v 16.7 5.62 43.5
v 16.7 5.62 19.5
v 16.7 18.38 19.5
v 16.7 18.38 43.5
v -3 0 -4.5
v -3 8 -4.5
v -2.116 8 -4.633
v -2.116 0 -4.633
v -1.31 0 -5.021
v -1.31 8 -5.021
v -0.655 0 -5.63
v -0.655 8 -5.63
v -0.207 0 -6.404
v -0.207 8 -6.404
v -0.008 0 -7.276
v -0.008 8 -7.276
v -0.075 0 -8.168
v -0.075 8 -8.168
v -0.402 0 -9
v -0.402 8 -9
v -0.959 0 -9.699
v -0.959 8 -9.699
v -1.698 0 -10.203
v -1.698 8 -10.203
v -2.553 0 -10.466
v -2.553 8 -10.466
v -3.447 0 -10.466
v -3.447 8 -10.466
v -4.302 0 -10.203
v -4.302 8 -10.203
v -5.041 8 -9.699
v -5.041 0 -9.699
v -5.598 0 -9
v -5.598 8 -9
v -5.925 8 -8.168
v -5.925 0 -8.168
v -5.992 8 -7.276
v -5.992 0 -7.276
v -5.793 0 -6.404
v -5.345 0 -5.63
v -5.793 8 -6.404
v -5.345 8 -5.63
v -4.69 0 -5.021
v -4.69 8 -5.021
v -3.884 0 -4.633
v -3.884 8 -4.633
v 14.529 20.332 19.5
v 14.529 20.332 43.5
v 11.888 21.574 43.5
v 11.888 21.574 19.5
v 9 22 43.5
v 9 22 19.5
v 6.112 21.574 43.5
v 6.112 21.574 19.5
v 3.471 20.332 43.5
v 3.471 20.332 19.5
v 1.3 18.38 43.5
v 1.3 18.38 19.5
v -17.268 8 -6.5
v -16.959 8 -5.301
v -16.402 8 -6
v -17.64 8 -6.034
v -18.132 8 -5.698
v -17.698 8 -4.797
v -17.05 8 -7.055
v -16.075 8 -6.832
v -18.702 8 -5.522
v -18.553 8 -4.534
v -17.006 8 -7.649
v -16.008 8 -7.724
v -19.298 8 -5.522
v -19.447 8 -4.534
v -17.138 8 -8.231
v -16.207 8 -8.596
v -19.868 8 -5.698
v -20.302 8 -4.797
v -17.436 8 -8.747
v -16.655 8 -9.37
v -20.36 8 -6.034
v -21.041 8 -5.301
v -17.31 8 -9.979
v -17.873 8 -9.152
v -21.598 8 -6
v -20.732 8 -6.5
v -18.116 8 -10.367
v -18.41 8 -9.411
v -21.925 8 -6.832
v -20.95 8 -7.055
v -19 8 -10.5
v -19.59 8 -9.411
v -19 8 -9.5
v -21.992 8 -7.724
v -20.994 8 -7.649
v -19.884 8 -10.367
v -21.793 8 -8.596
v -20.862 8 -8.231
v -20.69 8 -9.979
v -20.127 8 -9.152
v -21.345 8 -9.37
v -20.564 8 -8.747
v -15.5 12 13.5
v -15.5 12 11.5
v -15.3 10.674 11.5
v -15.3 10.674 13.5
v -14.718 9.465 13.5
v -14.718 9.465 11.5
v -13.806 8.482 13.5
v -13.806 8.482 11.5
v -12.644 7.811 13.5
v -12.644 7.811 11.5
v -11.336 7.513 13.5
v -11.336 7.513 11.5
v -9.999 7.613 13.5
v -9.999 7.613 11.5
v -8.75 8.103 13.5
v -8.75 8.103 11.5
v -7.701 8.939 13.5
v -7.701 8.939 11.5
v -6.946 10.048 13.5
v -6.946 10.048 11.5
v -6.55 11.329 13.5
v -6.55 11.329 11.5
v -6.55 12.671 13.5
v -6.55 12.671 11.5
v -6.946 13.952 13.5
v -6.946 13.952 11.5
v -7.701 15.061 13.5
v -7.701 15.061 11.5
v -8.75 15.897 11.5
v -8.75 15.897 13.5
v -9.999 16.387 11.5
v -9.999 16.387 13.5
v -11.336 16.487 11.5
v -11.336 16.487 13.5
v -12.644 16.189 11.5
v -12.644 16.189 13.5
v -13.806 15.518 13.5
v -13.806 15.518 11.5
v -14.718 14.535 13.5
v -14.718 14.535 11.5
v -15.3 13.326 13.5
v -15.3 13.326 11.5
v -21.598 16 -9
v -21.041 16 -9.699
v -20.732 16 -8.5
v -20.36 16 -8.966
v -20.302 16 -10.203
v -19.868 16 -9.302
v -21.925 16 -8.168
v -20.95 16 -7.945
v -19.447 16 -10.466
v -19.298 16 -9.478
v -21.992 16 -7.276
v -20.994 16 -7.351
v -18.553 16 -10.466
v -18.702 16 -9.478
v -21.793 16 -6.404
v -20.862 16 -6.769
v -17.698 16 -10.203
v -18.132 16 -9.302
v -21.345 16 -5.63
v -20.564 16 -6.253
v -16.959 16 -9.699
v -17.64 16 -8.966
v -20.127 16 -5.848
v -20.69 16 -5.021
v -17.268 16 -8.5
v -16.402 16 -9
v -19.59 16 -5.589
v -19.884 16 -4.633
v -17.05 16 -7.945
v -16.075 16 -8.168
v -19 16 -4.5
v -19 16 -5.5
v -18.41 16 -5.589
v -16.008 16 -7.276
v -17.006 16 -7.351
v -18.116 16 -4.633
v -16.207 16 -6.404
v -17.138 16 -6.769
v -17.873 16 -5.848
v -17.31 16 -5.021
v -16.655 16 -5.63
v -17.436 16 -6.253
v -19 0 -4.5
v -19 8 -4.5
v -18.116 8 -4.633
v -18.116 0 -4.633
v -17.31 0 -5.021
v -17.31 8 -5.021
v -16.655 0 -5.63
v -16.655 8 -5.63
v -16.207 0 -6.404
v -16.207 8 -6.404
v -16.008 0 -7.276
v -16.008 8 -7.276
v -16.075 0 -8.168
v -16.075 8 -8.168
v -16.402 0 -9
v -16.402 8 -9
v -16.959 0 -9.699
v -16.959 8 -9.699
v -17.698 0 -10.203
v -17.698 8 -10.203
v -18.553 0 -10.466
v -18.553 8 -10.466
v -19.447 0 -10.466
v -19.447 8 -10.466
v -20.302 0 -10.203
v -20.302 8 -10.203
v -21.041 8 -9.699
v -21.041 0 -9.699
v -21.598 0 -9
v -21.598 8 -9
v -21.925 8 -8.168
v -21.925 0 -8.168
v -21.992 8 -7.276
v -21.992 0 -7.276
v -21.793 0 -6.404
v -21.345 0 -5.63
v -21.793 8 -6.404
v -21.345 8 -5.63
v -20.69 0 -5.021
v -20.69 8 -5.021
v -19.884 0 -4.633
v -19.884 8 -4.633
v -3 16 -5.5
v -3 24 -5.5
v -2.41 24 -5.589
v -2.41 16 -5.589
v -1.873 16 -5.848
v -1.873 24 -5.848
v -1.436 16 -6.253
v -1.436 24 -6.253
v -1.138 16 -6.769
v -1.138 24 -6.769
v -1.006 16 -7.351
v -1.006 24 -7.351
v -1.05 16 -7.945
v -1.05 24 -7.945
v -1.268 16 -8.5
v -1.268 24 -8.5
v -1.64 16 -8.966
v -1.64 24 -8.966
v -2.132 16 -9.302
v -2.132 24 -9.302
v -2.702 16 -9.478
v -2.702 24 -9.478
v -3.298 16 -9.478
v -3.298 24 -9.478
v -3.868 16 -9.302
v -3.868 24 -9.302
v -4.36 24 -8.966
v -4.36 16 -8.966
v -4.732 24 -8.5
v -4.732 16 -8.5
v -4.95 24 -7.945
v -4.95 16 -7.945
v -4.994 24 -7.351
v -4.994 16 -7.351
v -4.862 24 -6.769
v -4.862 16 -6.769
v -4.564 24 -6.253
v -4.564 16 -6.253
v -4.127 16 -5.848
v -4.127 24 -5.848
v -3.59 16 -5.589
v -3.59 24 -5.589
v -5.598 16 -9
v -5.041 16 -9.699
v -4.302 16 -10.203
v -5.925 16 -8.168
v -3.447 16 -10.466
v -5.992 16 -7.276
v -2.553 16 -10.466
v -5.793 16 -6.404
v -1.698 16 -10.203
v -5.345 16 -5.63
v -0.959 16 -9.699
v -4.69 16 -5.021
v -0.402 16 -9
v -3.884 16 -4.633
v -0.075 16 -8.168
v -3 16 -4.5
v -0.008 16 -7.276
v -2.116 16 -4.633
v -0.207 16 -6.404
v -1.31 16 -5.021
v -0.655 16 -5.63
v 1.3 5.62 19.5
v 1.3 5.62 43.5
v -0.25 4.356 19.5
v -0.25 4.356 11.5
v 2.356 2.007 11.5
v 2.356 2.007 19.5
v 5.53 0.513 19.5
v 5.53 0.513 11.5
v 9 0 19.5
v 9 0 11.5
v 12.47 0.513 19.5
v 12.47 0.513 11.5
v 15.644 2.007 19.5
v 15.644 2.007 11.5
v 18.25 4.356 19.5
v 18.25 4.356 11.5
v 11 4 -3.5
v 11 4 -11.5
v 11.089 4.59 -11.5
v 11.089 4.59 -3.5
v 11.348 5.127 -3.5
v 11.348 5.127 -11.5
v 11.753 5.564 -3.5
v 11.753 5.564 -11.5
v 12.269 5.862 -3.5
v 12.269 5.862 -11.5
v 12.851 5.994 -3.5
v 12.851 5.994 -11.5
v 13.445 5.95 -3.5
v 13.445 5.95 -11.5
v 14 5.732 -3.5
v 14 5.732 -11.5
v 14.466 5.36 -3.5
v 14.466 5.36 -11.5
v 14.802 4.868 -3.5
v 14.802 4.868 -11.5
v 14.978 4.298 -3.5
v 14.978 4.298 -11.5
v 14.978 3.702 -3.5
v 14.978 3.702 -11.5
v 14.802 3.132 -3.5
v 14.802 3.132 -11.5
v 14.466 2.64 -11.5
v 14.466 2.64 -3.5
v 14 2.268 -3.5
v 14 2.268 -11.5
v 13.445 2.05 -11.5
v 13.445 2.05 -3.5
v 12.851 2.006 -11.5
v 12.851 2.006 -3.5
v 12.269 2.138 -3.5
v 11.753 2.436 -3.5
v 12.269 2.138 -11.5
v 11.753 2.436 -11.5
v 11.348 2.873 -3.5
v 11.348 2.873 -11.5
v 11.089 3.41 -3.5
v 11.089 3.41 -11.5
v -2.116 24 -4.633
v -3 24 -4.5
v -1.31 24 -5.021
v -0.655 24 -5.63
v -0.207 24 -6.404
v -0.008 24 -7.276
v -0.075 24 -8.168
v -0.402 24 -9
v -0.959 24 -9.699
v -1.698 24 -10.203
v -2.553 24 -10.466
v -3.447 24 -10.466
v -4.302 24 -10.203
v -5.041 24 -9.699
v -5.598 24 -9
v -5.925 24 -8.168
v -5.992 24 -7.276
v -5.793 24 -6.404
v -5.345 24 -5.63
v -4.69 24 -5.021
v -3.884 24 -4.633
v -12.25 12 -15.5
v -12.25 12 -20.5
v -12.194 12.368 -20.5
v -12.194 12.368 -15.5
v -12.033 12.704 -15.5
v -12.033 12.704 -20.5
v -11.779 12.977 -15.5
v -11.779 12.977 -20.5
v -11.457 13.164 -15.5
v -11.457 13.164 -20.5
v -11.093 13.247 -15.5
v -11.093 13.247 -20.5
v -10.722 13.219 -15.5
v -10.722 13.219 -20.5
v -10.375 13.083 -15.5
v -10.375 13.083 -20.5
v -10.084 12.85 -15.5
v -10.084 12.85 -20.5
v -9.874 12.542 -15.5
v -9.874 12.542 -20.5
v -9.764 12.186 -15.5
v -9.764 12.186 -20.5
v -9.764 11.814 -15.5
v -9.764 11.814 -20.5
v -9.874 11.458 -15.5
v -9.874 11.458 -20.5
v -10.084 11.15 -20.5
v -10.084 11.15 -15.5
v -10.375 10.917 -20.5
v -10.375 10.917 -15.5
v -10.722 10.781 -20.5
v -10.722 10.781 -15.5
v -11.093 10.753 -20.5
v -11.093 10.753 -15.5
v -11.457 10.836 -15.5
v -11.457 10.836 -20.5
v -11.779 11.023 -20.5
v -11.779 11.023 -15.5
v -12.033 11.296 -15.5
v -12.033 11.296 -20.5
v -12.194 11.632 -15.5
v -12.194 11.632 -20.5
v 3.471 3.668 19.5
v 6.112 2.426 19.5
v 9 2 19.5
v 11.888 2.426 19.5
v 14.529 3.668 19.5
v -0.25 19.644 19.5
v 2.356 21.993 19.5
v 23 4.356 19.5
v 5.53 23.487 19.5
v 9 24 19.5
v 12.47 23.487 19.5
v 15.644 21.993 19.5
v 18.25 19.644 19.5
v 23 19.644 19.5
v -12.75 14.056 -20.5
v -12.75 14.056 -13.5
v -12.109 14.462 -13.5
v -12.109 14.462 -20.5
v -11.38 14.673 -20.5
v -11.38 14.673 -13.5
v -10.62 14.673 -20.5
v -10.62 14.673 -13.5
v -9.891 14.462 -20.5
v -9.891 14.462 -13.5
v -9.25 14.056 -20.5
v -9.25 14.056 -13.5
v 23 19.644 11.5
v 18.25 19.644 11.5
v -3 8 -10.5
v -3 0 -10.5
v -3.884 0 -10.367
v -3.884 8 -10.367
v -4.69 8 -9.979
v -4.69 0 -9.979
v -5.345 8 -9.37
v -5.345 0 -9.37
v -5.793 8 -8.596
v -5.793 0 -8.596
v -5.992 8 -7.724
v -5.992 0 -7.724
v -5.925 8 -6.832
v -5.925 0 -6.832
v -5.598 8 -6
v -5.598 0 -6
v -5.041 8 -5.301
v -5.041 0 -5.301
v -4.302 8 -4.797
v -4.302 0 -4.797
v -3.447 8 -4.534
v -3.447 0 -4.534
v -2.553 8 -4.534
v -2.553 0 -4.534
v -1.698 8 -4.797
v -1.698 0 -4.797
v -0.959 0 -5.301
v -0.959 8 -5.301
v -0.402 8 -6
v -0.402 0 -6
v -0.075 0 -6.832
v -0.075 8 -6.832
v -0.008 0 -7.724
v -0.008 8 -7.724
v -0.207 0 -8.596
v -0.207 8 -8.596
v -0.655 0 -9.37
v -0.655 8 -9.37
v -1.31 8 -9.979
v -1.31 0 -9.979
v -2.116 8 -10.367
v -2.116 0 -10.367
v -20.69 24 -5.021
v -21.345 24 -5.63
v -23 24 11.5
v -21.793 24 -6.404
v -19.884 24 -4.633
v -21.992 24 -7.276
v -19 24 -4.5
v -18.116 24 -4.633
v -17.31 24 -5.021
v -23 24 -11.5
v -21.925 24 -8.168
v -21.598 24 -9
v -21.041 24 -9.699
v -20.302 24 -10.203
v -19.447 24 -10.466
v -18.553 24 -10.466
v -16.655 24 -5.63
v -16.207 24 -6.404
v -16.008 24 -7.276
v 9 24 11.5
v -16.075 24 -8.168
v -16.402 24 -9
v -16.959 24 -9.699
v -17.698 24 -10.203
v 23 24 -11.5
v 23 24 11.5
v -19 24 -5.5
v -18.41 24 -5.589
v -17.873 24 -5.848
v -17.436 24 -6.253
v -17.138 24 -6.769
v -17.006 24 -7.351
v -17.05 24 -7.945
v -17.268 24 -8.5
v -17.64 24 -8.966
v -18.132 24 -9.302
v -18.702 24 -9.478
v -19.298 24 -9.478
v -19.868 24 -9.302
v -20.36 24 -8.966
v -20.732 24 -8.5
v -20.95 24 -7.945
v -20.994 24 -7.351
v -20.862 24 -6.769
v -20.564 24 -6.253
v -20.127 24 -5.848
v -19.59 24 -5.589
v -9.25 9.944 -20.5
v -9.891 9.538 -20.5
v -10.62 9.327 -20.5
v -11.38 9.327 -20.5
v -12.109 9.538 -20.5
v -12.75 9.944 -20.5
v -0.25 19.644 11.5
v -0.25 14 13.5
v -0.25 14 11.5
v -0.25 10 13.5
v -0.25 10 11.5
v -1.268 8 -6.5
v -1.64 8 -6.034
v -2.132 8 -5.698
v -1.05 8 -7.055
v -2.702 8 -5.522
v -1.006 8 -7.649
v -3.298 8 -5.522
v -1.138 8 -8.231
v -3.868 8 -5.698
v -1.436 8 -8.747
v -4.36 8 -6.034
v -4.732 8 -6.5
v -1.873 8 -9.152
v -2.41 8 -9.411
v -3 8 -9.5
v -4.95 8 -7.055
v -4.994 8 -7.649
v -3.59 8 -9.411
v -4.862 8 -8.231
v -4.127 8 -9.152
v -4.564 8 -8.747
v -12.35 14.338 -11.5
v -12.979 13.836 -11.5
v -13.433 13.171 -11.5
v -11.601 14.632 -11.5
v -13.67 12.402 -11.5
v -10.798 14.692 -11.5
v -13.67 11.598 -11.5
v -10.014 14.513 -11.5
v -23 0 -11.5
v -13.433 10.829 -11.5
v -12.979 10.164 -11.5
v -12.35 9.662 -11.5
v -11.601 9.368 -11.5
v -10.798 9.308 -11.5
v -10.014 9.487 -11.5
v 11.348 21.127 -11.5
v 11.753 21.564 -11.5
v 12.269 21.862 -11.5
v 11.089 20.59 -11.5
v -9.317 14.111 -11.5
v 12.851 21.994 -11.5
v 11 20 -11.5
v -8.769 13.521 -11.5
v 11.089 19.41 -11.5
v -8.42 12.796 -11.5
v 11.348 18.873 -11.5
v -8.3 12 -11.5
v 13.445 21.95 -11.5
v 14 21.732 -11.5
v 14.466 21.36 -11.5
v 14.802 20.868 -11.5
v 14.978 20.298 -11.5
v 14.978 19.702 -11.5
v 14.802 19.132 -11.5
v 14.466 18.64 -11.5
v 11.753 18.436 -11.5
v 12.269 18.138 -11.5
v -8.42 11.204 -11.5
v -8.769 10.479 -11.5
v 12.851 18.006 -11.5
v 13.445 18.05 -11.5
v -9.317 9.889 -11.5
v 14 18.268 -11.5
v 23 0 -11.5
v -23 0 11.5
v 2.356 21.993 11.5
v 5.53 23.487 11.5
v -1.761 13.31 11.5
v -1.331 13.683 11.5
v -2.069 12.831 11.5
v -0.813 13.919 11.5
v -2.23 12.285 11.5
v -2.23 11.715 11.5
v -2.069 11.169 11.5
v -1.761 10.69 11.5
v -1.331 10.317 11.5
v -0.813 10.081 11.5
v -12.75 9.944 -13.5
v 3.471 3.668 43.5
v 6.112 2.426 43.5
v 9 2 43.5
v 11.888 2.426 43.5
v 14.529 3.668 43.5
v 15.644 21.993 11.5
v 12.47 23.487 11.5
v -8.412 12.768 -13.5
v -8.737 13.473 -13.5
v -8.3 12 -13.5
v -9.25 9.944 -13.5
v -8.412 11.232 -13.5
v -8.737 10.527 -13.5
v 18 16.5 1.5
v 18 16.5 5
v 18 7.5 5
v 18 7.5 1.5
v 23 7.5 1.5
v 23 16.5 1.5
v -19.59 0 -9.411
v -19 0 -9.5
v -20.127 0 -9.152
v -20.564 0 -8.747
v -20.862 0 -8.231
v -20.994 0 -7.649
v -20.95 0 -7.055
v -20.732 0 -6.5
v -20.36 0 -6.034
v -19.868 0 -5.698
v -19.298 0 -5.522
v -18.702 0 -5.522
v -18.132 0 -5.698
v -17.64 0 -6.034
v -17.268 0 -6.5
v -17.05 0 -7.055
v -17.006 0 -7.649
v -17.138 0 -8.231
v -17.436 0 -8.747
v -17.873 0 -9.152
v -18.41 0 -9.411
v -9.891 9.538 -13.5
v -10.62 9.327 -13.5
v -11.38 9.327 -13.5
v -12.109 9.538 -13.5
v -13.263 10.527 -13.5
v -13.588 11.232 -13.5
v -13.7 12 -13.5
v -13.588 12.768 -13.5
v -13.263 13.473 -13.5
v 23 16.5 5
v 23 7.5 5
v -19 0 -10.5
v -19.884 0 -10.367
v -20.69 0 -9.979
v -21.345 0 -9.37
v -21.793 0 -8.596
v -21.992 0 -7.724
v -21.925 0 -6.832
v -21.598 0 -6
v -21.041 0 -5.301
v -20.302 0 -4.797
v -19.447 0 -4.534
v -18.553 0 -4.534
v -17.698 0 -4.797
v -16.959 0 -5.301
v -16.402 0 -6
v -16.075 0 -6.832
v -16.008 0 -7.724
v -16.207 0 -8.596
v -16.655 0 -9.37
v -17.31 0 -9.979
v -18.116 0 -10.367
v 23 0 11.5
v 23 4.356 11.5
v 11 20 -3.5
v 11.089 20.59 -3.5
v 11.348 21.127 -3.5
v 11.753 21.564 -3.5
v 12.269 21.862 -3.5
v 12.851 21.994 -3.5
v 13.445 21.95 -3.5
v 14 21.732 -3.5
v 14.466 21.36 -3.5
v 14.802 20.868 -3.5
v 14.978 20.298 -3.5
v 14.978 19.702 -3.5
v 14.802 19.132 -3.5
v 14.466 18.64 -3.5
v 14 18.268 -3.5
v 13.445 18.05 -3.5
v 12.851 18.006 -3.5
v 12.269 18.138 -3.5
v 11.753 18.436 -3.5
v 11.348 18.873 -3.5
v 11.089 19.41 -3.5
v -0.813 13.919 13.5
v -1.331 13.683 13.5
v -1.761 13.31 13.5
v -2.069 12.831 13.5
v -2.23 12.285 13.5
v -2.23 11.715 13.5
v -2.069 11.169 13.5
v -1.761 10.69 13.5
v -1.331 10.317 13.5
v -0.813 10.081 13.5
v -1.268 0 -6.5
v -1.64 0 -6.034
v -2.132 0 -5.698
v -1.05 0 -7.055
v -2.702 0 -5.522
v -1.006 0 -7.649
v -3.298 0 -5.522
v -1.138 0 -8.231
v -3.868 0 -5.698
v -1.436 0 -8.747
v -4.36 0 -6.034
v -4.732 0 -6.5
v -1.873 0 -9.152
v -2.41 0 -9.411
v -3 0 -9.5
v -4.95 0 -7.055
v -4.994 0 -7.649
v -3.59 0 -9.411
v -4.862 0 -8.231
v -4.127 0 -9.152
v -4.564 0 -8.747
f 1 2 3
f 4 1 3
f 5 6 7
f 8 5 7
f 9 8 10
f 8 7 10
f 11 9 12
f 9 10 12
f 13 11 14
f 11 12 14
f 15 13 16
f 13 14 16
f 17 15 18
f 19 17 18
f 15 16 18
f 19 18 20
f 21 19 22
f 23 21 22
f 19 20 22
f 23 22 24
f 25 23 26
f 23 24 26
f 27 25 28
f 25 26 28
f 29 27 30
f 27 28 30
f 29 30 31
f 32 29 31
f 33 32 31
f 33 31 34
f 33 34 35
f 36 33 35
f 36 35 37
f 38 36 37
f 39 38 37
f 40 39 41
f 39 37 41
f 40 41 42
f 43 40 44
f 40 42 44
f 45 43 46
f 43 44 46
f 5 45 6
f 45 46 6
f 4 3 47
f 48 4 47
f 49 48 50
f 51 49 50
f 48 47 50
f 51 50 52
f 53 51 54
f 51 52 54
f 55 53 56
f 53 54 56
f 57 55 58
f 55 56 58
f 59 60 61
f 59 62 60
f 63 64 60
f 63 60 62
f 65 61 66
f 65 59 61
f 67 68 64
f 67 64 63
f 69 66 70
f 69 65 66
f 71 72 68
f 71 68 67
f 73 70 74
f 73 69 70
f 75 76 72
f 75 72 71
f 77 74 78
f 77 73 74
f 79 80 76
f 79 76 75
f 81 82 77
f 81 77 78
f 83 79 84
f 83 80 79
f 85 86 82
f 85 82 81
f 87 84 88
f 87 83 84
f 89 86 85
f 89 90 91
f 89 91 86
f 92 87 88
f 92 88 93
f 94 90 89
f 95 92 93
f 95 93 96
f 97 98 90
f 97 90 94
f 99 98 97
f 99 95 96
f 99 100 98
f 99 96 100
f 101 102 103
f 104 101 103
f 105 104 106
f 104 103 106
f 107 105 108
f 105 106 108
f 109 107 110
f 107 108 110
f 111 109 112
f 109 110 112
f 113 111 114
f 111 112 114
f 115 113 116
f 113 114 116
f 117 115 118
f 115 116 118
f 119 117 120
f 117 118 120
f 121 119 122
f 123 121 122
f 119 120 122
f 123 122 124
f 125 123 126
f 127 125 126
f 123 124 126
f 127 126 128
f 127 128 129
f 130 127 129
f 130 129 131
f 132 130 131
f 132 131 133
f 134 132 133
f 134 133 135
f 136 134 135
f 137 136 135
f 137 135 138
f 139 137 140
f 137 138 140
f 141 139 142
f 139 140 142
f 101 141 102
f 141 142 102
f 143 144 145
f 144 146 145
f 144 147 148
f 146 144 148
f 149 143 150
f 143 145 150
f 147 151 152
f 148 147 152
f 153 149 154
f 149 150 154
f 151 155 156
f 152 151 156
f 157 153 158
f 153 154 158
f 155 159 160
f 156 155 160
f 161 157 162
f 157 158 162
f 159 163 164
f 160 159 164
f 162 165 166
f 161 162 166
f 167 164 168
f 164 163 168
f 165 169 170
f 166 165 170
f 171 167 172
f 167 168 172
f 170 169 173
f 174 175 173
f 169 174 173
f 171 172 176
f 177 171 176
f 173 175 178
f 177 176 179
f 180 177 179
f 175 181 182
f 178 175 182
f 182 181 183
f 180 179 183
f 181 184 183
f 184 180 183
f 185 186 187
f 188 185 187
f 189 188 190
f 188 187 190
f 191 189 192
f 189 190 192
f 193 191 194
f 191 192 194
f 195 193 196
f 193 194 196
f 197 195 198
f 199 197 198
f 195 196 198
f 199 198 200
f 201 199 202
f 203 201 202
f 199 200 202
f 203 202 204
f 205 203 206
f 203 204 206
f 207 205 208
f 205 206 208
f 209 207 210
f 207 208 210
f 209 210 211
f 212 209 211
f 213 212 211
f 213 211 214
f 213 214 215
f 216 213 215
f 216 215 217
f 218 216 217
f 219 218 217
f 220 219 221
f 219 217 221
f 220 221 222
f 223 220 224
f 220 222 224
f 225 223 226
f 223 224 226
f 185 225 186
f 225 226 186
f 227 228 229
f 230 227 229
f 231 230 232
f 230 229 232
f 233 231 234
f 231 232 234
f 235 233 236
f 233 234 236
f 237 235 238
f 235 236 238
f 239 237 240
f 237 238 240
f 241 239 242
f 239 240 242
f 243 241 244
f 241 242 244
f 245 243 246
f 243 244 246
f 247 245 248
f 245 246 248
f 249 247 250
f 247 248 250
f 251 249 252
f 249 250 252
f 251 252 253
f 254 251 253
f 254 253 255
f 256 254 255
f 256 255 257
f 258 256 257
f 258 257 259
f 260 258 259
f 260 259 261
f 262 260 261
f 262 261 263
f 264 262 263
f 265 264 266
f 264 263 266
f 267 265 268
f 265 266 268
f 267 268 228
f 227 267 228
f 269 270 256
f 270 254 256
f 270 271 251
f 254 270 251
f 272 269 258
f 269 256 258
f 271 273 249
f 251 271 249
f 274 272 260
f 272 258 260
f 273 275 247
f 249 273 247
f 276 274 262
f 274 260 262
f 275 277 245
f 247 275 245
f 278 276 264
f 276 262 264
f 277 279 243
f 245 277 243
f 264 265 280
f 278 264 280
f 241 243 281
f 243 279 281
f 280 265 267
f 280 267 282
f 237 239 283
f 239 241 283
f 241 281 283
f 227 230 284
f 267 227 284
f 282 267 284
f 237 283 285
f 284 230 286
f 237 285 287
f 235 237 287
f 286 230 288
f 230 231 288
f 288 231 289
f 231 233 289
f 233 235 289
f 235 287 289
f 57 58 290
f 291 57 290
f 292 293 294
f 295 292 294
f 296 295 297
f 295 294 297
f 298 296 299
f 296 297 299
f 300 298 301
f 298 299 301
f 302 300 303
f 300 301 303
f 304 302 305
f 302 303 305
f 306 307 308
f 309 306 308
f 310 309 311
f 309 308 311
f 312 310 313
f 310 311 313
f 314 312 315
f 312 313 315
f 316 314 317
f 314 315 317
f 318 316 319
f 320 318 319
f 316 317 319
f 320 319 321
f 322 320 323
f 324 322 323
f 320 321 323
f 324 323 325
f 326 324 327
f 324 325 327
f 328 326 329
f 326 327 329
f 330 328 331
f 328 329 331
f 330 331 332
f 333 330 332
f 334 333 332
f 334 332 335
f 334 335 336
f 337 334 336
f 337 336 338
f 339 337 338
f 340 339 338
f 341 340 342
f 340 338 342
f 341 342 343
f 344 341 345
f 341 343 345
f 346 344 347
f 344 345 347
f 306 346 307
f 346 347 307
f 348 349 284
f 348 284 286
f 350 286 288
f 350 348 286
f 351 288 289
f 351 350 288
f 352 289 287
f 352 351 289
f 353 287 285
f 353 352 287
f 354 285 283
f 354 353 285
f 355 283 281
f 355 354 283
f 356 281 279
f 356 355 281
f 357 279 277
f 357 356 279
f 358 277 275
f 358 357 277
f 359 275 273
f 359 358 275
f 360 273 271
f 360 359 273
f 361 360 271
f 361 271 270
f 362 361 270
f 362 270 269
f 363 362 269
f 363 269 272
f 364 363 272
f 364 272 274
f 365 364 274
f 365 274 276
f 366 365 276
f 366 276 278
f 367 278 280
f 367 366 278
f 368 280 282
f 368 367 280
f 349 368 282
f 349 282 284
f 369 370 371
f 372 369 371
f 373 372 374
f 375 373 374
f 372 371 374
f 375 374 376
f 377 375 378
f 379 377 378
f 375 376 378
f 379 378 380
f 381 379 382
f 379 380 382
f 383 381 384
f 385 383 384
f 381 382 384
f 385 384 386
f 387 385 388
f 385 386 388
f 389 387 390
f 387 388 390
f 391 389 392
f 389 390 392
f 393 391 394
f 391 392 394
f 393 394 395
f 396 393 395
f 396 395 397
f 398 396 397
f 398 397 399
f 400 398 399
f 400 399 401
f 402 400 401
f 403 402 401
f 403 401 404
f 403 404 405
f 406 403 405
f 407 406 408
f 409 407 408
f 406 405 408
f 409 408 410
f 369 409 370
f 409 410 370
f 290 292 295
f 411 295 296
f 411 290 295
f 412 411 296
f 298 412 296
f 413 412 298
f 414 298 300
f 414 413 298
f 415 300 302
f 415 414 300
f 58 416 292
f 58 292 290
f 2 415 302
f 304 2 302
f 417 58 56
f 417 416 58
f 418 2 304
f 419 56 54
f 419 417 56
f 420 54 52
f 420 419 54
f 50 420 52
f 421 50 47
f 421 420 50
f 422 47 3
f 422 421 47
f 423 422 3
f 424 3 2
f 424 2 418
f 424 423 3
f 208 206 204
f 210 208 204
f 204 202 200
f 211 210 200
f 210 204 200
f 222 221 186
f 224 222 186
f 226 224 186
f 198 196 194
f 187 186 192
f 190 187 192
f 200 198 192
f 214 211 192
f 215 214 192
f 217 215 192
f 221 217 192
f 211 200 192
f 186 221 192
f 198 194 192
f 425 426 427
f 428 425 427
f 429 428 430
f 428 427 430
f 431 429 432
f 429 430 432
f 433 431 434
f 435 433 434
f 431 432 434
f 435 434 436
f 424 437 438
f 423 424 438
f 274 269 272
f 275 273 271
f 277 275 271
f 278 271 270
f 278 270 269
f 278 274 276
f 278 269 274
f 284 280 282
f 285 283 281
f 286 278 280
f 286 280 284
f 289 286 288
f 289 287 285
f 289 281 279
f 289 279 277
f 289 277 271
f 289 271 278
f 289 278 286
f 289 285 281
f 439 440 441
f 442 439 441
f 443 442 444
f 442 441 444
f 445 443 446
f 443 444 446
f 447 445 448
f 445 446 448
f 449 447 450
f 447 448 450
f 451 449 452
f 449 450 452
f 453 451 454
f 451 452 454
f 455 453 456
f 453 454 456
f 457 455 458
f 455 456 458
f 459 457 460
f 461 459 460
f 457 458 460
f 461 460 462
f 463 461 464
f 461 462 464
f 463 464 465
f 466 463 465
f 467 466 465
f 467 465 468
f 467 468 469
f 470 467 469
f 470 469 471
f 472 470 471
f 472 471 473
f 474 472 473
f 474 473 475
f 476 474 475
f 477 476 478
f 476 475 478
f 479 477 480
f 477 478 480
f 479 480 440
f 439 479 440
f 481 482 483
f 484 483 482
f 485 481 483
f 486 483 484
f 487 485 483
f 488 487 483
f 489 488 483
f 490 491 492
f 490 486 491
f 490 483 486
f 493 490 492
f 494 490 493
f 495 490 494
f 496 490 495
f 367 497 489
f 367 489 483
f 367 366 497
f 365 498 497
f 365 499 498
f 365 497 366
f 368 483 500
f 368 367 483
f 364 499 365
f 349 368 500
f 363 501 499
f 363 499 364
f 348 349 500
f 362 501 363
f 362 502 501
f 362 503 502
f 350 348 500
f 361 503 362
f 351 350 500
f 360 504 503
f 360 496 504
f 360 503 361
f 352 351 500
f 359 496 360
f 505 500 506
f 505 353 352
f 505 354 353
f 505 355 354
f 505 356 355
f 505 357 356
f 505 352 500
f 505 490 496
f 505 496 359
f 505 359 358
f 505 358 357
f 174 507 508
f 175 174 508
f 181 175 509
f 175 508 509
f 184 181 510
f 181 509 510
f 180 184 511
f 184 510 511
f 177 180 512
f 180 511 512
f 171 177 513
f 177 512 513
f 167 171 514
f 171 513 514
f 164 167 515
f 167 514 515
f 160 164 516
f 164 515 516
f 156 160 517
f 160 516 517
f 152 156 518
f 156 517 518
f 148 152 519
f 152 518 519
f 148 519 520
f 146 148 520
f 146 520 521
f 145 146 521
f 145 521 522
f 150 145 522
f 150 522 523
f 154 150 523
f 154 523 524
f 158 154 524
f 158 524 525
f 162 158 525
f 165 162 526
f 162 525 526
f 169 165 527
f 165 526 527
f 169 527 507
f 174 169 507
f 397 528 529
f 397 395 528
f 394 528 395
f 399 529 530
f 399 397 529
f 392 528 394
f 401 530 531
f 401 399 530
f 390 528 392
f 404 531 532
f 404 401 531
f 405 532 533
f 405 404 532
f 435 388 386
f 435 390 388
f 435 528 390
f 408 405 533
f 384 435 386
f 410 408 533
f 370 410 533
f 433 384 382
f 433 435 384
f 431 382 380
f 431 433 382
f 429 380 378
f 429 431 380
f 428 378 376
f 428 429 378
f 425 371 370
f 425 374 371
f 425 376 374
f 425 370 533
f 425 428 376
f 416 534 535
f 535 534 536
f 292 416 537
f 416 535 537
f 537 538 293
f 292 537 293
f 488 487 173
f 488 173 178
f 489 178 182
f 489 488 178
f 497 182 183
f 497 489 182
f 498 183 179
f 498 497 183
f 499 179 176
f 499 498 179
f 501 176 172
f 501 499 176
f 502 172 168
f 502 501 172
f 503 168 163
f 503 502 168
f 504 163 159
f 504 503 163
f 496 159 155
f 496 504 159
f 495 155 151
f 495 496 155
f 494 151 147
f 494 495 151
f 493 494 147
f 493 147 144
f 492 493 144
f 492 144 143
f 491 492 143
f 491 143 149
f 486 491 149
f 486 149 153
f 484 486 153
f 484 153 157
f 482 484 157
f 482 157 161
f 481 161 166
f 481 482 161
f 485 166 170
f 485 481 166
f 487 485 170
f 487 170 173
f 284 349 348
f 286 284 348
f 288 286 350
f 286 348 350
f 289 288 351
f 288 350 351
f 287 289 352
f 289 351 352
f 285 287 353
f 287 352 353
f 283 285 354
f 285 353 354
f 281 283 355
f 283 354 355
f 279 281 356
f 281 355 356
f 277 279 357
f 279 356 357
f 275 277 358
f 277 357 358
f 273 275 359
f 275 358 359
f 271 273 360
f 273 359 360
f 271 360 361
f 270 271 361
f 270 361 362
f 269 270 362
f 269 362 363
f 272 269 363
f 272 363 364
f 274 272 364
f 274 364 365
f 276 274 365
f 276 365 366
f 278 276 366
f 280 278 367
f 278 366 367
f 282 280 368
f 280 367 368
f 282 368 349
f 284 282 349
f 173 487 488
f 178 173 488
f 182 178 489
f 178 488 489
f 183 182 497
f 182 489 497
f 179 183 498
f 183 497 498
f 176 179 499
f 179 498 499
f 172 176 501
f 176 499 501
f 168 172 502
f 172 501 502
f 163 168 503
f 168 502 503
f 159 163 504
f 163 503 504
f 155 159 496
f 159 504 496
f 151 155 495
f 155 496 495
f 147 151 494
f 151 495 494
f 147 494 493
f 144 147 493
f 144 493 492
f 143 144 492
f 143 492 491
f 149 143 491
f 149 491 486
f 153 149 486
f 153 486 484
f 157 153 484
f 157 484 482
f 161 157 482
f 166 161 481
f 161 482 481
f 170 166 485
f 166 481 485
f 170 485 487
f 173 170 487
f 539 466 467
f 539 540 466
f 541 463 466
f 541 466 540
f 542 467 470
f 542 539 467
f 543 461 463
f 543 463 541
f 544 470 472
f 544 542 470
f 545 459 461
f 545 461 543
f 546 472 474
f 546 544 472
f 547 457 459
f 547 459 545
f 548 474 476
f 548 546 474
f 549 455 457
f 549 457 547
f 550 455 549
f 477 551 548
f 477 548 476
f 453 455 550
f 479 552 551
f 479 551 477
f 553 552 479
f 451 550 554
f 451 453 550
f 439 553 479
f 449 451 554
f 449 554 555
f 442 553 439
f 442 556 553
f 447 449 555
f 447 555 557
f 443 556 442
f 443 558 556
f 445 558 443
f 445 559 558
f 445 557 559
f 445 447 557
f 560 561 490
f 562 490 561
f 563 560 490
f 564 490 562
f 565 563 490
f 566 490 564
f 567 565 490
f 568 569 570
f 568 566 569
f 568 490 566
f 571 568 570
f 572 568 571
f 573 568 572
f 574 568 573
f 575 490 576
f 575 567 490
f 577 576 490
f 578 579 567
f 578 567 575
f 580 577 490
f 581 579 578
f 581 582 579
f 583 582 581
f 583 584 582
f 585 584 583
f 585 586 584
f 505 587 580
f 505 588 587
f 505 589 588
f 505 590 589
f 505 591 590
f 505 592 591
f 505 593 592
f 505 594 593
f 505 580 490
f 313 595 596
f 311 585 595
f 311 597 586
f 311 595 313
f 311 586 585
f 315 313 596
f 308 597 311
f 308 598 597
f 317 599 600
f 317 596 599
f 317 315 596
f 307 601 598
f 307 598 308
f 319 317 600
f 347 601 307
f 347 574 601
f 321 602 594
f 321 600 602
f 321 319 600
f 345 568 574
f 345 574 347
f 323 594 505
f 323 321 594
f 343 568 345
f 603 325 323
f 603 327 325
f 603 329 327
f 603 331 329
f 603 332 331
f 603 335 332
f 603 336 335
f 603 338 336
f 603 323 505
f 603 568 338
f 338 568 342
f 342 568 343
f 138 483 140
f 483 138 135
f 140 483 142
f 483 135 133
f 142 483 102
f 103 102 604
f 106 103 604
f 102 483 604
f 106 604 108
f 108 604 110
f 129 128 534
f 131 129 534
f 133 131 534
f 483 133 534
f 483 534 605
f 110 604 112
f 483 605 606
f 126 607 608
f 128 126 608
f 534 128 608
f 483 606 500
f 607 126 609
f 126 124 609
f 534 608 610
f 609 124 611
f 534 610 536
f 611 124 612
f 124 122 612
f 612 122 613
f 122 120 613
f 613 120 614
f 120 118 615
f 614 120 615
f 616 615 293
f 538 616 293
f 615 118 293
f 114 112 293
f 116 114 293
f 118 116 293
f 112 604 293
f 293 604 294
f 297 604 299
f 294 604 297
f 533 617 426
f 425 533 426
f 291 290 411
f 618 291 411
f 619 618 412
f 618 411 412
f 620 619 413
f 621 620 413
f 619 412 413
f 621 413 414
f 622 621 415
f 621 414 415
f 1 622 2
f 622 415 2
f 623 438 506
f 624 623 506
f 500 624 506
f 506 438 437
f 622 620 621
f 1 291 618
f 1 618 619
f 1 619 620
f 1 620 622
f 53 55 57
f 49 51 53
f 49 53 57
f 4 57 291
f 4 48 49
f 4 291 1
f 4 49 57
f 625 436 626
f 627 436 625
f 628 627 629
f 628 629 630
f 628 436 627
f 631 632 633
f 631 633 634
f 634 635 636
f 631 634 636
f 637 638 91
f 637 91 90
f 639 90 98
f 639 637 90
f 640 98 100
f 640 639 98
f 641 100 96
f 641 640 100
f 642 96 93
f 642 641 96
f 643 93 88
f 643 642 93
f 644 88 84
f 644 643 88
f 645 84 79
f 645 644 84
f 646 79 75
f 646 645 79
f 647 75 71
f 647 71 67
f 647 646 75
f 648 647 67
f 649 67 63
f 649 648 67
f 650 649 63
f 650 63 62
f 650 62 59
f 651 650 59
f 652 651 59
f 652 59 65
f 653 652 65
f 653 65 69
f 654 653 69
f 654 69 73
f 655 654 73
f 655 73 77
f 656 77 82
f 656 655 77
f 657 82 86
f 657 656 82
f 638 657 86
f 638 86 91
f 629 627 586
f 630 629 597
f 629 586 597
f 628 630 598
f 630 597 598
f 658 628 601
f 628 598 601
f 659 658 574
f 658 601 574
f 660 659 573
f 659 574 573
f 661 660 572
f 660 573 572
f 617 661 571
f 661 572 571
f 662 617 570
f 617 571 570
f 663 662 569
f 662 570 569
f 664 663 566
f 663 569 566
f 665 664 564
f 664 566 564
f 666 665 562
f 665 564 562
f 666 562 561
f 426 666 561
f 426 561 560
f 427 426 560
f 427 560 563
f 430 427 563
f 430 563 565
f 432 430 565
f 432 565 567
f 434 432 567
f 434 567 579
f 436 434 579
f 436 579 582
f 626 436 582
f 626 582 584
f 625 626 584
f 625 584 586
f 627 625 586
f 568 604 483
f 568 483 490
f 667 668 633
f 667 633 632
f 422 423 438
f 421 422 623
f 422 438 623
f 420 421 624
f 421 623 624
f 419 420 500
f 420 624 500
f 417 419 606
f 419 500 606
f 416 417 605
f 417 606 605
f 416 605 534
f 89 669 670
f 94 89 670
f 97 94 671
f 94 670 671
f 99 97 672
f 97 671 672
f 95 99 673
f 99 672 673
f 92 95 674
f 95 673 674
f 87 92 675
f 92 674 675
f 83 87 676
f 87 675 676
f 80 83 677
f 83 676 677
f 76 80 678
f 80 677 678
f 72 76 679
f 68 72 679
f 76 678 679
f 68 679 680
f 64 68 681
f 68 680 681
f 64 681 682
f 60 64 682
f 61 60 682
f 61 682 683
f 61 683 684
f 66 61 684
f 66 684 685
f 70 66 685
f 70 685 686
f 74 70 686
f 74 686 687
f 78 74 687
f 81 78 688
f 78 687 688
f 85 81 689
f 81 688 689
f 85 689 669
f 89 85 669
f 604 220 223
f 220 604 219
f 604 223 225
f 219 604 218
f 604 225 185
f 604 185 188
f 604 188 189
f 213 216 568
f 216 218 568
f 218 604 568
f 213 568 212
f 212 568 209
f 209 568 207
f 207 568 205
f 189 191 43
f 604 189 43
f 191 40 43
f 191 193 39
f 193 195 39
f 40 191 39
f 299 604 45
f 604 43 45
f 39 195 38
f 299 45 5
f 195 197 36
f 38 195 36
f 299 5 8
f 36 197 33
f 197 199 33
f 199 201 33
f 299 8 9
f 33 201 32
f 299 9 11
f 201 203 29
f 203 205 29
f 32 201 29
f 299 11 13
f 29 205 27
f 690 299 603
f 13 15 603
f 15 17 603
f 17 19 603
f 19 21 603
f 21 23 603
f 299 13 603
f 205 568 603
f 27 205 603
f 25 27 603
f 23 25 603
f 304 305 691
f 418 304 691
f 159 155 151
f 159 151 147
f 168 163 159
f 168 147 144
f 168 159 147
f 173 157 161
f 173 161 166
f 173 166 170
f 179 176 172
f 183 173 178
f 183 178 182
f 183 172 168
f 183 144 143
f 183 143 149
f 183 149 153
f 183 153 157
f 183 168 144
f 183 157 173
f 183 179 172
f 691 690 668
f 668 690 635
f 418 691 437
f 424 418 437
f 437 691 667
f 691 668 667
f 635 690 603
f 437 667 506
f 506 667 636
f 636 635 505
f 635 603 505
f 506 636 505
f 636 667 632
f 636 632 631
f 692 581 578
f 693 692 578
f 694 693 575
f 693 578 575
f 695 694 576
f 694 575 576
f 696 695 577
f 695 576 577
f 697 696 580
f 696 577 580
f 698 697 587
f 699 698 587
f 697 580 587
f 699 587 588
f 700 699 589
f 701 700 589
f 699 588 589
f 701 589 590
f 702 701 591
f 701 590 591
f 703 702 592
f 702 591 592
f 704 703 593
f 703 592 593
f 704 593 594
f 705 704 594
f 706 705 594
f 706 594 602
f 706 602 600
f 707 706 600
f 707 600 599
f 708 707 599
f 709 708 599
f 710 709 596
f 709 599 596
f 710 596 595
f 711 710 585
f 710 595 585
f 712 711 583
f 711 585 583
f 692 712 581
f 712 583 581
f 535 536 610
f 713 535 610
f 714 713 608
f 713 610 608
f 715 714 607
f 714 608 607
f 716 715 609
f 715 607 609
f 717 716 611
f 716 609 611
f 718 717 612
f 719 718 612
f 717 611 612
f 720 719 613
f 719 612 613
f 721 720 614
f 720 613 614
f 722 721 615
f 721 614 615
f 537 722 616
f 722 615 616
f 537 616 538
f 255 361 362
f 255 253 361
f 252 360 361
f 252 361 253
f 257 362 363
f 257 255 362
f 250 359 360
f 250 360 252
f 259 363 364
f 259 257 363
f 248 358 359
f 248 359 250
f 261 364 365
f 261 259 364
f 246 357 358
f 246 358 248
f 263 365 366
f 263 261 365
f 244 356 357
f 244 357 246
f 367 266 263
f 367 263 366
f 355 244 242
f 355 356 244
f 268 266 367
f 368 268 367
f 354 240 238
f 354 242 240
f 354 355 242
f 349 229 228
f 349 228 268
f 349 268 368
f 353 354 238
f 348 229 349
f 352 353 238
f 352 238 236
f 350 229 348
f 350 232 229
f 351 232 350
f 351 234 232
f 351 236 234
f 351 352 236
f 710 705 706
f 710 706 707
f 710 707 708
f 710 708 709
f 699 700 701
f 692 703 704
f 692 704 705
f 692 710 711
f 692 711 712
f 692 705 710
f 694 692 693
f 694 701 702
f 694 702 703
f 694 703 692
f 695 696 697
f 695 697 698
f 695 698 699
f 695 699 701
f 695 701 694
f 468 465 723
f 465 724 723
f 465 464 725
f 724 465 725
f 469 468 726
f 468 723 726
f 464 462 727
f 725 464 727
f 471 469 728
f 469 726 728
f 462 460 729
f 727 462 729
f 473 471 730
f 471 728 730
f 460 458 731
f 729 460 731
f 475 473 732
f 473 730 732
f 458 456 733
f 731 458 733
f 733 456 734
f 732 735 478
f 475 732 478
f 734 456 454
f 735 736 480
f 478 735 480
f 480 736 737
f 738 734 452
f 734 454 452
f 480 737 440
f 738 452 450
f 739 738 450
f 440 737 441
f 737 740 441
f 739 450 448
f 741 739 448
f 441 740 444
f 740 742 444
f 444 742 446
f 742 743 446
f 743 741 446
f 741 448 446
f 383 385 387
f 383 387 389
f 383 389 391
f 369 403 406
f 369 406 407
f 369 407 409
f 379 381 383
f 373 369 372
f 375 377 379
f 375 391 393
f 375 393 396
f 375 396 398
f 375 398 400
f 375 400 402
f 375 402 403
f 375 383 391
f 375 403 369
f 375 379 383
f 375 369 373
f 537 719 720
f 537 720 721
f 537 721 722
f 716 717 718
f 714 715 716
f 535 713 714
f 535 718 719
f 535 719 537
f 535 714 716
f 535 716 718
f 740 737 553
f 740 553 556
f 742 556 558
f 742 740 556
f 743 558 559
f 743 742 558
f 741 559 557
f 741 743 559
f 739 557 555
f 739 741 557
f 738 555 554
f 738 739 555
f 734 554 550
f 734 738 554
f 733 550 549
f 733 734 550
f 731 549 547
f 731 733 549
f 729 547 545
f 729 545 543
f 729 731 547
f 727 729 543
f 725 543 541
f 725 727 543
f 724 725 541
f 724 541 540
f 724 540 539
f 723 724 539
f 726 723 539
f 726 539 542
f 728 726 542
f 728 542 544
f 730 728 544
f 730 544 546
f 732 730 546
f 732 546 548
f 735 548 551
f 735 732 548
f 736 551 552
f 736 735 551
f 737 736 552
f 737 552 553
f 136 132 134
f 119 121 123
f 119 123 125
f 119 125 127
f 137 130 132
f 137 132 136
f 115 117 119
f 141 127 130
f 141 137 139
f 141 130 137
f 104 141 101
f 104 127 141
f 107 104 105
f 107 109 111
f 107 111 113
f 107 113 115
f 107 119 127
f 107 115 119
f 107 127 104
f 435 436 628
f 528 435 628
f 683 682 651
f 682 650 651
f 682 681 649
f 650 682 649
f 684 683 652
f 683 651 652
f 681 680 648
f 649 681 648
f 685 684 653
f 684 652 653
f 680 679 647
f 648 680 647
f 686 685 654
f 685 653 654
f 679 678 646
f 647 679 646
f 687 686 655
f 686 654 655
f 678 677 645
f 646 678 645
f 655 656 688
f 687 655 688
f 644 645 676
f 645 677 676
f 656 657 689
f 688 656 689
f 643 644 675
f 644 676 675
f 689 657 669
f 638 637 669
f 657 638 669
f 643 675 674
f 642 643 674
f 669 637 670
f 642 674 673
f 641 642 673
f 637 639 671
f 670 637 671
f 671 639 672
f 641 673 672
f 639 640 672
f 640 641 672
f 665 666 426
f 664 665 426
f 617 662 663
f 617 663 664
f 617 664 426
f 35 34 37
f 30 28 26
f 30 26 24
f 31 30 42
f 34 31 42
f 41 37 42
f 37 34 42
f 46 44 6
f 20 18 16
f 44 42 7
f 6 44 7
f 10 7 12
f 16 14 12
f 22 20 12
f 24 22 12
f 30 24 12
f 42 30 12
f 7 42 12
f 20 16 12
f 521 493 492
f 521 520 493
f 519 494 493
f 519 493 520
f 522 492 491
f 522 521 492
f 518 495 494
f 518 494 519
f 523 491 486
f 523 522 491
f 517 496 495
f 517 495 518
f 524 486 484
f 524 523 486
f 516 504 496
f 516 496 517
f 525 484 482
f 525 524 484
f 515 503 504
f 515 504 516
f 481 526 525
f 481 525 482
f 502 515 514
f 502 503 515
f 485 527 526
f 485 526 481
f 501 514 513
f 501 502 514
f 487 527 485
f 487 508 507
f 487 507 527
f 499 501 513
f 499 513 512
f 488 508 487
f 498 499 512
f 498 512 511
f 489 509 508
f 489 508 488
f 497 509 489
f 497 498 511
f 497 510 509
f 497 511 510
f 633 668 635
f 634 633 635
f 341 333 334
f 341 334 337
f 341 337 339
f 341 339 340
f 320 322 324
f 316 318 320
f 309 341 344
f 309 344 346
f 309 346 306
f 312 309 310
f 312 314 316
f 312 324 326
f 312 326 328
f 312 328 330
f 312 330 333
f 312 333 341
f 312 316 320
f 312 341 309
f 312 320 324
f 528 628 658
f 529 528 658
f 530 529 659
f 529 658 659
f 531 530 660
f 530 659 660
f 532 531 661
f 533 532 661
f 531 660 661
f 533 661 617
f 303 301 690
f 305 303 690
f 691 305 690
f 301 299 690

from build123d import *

# Parameters (mm, degrees)
SKETCH_1_W            = 46
SKETCH_1_H            = 23
EXTRUDE_1_DEPTH       = 24
EXTRUDE_2_DEPTH       = 8
EXTRUDE_3_DEPTH       = 24
SKETCH_4_R            = 4.5
SKETCH_4_R_2          = 2
EXTRUDE_4_DEPTH       = 2
SKETCH_6_W            = 3.5
SKETCH_6_H            = 9
CUT_EXTRUDE_1_DEPTH   = 5
SKETCH_7_R            = 2.7
EXTRUDE_5_DEPTH       = 2
EXTRUDE_6_DEPTH       = 7
SKETCH_9_R            = 1.25
CUT_EXTRUDE_2_DEPTH   = 5
SKETCH_10_R           = 3
CUT_EXTRUDE_3_DEPTH   = 8
CUT_EXTRUDE_START     = -16
SKETCH_10_2_R         = 3
CUT_EXTRUDE_4_DEPTH   = 8
SKETCH_11_R           = 2
CUT_EXTRUDE_5_DEPTH   = 8
SKETCH1_R             = 3
SKETCH1_R_2           = 2
BOSS_EXTRUDE1_DEPTH   = 8
BOSS_EXTRUDE1_2_DEPTH = 8
BOSS_EXTRUDE2_START   = -24
SKETCH1_2_R           = 3
SKETCH1_2_R_2         = 2
BOSS_EXTRUDE2_DEPTH   = 8
BOSS_EXTRUDE2_2_DEPTH = 8


with BuildPart() as part:
    # 草图1 → 凸台-拉伸1 (new body)
    with BuildSketch(Plane(origin=(0, 0, 0), x_dir=(1, 0, 0), z_dir=(0, 1, 0))):
        Rectangle(SKETCH_1_W, SKETCH_1_H)
    extrude(amount=EXTRUDE_1_DEPTH)

    # 草图2 → 凸台-拉伸2 (add)
    with BuildSketch(Plane.XY.offset(11.5)):
        with BuildLine():
            Line((-0.25, 19.644442426), (-0.25, 4.355557574))
            ThreePointArc((-0.25, 4.355557574), (9, 0), (18.25, 4.355557574))
            Line((18.25, 4.355557574), (23, 4.355557574))
            Line((23, 4.355557574), (23, 19.644442426))
            Line((23, 19.644442426), (18.25, 19.644442426))
            ThreePointArc((18.25, 19.644442426), (9, 24), (-0.25, 19.644442426))
        make_face()
    extrude(amount=EXTRUDE_2_DEPTH)

    # 草图3 → 凸台-拉伸3 (add)
    with BuildSketch(Plane.XY.offset(19.5)):
        with BuildLine():
            Line((1.3, 18.380438856), (1.3, 5.619561144))
            ThreePointArc((1.3, 5.619561144), (9, 2), (16.7, 5.619561144))
            Line((16.7, 5.619561144), (16.7, 18.380438856))
            ThreePointArc((16.7, 18.380438856), (9, 22), (1.3, 18.380438856))
        make_face()
    extrude(amount=EXTRUDE_3_DEPTH)

    # 草图4 → 凸台-拉伸4 (add)
    with BuildSketch(Plane.XY.offset(11.5)):
        with Locations(Location((-11, 12, 0), (0, 0, 180))):
            Circle(SKETCH_4_R)
        with Locations((-0.25, 12)):
            Circle(SKETCH_4_R_2)
    extrude(amount=EXTRUDE_4_DEPTH)

    # 草图6 → 切除-拉伸1 (cut)
    with BuildSketch(Plane(origin=(23, 0, 0), x_dir=(0, 0, -1), z_dir=(1, 0, 0))):
        with Locations((-3.25, 12)):
            Rectangle(SKETCH_6_W, SKETCH_6_H)
    extrude(amount=-CUT_EXTRUDE_1_DEPTH, mode=Mode.SUBTRACT)

    # 草图7 → 凸台-拉伸5 (add)
    with BuildSketch(Plane(origin=(0, 0, -11.5), x_dir=(-1, 0, 0), z_dir=(0, 0, -1))):
        with Locations(Location((11, 12, 0), (0, 0, 180))):
            Circle(SKETCH_7_R)
    extrude(amount=EXTRUDE_5_DEPTH)

    # 草图8 → 凸台-拉伸6 (add)
    with BuildSketch(Plane(origin=(0, 0, -13.5), x_dir=(-1, 0, 0), z_dir=(0, 0, -1))):
        with BuildLine():
            Line((9.25, 14.056088519), (9.25, 9.943911481))
            ThreePointArc((9.25, 9.943911481), (11, 9.3), (12.75, 9.943911481))
            Line((12.75, 9.943911481), (12.75, 14.056088519))
            ThreePointArc((12.75, 14.056088519), (11, 14.7), (9.25, 14.056088519))
        make_face()
    extrude(amount=EXTRUDE_6_DEPTH)

    # 草图9 → 切除-拉伸2 (cut)
    with BuildSketch(Plane(origin=(0, 0, -20.5), x_dir=(-1, 0, 0), z_dir=(0, 0, -1))):
        with Locations((11, 12)):
            Circle(SKETCH_9_R)
    extrude(amount=-CUT_EXTRUDE_2_DEPTH, mode=Mode.SUBTRACT)

    # 草图10 → 切除-拉伸3 (cut)
    with BuildSketch(Plane(origin=(0, 24, 0), x_dir=(1, 0, 0), z_dir=(0, 1, 0))):
        with Locations(Location((-19, 7.5, 0), (0, 0, 270))):
            Circle(SKETCH_10_R)
        with Locations(Location((-3, 7.5, 0), (0, 0, 270))):
            Circle(SKETCH_10_R)
    extrude(amount=-CUT_EXTRUDE_3_DEPTH, mode=Mode.SUBTRACT)

    # 草图10<2> → 切除-拉伸4 (cut)
    with BuildSketch(Plane(origin=(0, 24, 0), x_dir=(1, 0, 0), z_dir=(0, 1, 0)).offset(CUT_EXTRUDE_START)):
        with Locations(Location((-19, 7.5, 0), (0, 0, 270))):
            Circle(SKETCH_10_2_R)
        with Locations(Location((-3, 7.5, 0), (0, 0, 270))):
            Circle(SKETCH_10_2_R)
    extrude(amount=-CUT_EXTRUDE_4_DEPTH, mode=Mode.SUBTRACT)

    # 草图11 → 切除-拉伸5 (cut)
    with BuildSketch(Plane(origin=(0, 0, -11.5), x_dir=(-1, 0, 0), z_dir=(0, 0, -1))):
        with Locations((-13, 20)):
            Circle(SKETCH_11_R)
        with Locations((-13, 4)):
            Circle(SKETCH_11_R)
    extrude(amount=-CUT_EXTRUDE_5_DEPTH, mode=Mode.SUBTRACT)


with BuildPart() as body_2:
    # Sketch1 → Boss-Extrude1 (new body)
    with BuildSketch(Plane(origin=(0, 24, 0), x_dir=(1, 0, 0), z_dir=(0, 1, 0))):
        with Locations(Location((-3, 7.5, 0), (0, 0, 270))):
            Circle(SKETCH1_R)
        with Locations(Location((-3, 7.5, 0), (0, 0, 270))):
            Circle(SKETCH1_R_2, mode=Mode.SUBTRACT)
    extrude(amount=-BOSS_EXTRUDE1_DEPTH)


with BuildPart() as body_3:
    # Sketch1 → Boss-Extrude1 2 (new body)
    with BuildSketch(Plane(origin=(0, 24, 0), x_dir=(1, 0, 0), z_dir=(0, 1, 0))):
        with Locations(Location((-19, 7.5, 0), (0, 0, 270))):
            Circle(SKETCH1_R)
        with Locations(Location((-19, 7.5, 0), (0, 0, 270))):
            Circle(SKETCH1_R_2, mode=Mode.SUBTRACT)
    extrude(amount=-BOSS_EXTRUDE1_2_DEPTH)


with BuildPart() as body_4:
    # Sketch1<2> → Boss-Extrude2 (new body)
    with BuildSketch(Plane(origin=(0, 24, 0), x_dir=(1, 0, 0), z_dir=(0, 1, 0)).offset(BOSS_EXTRUDE2_START)):
        with Locations(Location((-3, 7.5, 0), (0, 0, 90))):
            Circle(SKETCH1_2_R)
        with Locations(Location((-3, 7.5, 0), (0, 0, 90))):
            Circle(SKETCH1_2_R_2, mode=Mode.SUBTRACT)
    extrude(amount=BOSS_EXTRUDE2_DEPTH)


with BuildPart() as body_5:
    # Sketch1<2> → Boss-Extrude2 2 (new body)
    with BuildSketch(Plane(origin=(0, 24, 0), x_dir=(1, 0, 0), z_dir=(0, 1, 0)).offset(BOSS_EXTRUDE2_START)):
        with Locations(Location((-19, 7.5, 0), (0, 0, 90))):
            Circle(SKETCH1_2_R)
        with Locations(Location((-19, 7.5, 0), (0, 0, 90))):
            Circle(SKETCH1_2_R_2, mode=Mode.SUBTRACT)
    extrude(amount=BOSS_EXTRUDE2_2_DEPTH)


solid = Compound([part.part, body_2.part, body_3.part, body_4.part, body_5.part])
